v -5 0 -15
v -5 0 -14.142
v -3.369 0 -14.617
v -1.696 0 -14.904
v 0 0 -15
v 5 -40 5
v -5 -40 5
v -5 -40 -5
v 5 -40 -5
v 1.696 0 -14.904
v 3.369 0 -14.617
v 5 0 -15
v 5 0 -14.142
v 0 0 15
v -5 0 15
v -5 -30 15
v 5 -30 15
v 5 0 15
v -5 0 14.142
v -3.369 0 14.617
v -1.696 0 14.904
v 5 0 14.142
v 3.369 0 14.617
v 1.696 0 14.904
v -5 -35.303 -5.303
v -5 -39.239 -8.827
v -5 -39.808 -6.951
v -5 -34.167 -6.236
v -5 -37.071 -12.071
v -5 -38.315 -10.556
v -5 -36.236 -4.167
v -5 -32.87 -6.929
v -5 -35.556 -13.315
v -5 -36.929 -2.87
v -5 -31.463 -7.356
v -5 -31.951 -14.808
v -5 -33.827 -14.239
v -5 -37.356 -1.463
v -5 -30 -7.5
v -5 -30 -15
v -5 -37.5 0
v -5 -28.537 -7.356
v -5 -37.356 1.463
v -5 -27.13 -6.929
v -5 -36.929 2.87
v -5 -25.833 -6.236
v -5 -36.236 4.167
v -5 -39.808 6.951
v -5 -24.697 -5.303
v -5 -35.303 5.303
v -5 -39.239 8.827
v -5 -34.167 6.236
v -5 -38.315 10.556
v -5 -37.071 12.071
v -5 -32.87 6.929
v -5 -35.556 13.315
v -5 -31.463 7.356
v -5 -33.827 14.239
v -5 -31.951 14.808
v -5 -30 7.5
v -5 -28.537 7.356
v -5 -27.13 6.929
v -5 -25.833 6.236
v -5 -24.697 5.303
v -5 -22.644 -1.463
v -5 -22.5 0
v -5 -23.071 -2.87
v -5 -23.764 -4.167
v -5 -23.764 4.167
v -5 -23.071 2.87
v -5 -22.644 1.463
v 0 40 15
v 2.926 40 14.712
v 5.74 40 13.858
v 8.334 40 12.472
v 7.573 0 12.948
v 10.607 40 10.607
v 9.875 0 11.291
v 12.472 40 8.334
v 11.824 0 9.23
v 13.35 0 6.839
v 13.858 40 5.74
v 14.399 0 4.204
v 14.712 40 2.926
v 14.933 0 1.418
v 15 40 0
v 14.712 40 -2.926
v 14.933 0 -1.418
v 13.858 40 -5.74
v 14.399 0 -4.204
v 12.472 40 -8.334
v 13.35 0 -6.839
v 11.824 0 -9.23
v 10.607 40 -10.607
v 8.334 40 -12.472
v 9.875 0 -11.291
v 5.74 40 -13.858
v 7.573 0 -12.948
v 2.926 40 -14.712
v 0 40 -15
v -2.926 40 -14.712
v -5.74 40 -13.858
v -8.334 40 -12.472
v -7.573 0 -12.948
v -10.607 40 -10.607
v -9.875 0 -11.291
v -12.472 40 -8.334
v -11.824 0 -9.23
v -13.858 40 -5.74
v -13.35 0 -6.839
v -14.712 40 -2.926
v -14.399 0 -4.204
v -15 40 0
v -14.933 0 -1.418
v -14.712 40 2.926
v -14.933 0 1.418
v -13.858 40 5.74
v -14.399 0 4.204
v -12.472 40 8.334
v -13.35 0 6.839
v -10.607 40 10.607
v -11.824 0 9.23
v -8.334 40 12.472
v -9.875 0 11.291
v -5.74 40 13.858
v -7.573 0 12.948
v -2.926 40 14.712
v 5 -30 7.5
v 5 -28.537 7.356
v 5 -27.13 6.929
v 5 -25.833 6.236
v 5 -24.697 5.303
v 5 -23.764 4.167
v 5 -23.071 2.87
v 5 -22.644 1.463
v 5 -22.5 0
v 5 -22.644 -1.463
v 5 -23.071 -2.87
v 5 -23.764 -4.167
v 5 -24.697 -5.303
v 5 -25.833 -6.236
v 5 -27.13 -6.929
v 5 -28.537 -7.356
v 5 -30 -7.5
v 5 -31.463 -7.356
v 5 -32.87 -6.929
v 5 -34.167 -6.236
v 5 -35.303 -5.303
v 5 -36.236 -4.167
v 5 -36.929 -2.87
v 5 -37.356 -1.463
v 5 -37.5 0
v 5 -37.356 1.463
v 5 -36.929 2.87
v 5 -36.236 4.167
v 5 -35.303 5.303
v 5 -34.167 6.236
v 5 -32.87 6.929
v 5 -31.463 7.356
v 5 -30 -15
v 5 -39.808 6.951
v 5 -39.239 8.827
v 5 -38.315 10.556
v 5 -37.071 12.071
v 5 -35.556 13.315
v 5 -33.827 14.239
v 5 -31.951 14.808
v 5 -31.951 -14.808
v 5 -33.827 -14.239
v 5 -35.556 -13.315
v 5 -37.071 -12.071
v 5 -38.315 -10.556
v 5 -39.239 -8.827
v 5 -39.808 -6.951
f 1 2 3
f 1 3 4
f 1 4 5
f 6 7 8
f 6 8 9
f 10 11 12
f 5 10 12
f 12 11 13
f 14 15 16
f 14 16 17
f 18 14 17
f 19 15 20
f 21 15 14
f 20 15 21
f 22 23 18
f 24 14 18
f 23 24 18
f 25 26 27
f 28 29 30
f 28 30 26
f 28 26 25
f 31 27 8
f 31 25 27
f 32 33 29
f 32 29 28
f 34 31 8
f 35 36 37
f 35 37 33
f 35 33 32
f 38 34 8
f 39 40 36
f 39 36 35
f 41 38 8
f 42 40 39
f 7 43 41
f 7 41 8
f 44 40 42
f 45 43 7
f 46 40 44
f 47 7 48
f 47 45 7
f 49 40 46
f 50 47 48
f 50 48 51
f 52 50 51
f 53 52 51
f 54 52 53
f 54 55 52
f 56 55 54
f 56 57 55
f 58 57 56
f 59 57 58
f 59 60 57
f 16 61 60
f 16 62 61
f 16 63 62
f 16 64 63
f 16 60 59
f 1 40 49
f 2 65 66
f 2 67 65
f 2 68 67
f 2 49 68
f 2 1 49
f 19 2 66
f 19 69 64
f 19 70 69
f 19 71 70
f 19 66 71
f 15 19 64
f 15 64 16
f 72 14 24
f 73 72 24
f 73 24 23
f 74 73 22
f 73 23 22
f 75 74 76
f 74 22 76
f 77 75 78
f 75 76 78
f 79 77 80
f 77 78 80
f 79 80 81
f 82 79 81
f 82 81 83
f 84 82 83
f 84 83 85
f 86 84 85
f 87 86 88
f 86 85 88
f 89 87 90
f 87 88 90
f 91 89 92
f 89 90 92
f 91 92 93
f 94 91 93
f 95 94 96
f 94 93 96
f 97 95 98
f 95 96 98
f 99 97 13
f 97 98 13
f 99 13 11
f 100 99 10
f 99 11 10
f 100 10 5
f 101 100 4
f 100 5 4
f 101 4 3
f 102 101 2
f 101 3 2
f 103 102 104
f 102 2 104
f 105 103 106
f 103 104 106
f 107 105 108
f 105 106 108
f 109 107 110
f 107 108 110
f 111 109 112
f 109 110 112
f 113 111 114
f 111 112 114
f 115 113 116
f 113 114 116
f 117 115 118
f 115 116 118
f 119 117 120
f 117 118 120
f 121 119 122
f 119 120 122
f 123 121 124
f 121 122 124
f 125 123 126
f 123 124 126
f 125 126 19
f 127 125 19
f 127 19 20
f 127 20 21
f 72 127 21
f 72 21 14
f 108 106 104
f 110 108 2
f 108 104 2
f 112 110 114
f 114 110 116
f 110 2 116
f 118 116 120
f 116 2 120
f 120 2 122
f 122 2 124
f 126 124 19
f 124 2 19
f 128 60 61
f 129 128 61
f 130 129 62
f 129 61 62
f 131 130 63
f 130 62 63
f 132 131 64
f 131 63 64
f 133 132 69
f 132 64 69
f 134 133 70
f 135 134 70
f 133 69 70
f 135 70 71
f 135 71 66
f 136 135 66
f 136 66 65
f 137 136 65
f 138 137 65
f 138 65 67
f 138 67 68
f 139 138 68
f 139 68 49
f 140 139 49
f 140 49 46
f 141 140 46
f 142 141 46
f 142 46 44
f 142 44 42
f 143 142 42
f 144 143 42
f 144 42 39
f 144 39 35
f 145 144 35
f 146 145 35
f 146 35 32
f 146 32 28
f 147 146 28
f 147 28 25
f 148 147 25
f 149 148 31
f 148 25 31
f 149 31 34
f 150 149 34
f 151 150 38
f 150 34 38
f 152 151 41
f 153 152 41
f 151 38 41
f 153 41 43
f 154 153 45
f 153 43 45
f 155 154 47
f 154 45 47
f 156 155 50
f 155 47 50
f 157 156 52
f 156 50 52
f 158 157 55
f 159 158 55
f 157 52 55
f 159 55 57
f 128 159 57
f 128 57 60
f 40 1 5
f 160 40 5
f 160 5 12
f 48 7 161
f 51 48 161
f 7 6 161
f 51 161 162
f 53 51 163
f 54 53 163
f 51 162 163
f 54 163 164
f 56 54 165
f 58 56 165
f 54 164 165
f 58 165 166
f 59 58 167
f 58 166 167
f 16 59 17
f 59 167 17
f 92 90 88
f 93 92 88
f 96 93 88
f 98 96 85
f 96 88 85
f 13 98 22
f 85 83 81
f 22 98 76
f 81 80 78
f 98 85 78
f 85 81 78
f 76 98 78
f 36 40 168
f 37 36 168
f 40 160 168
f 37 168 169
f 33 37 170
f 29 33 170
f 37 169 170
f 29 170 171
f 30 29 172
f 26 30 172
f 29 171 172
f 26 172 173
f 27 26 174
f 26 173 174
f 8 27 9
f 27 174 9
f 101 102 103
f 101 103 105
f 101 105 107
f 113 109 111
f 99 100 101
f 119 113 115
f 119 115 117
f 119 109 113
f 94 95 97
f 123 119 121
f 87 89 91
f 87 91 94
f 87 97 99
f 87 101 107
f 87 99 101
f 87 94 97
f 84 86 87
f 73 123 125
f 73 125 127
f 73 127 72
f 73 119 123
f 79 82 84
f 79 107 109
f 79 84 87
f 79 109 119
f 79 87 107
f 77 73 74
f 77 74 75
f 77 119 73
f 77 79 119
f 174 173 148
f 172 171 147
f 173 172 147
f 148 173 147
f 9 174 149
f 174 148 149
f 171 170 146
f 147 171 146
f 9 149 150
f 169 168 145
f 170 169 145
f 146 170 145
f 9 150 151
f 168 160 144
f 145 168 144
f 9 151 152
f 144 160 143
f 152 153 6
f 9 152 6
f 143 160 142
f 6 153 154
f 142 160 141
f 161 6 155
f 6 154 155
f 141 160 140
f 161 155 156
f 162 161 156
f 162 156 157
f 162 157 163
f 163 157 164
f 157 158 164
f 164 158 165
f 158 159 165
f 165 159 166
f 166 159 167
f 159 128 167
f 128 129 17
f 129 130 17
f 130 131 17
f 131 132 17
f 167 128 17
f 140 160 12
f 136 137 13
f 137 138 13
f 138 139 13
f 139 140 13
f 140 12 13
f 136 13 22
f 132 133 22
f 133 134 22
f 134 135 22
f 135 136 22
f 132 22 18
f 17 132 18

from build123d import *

# Parameters (mm, degrees)
SKETCH1_R           = 15
BOSS_EXTRUDE1_DEPTH = 40
SKETCH2_W           = 10
SKETCH2_H           = 30
BOSS_EXTRUDE2_DEPTH = 40
SKETCH3_R           = 7.5
CUT_EXTRUDE1_DEPTH  = 40
FILLET2_R           = 10


with BuildPart() as part:
    # Sketch1 → Boss-Extrude1 (new body)
    with BuildSketch(Plane(origin=(0, 0, 0), x_dir=(1, 0, 0), z_dir=(0, 1, 0))):
        with Locations(Location((0, 0, 0), (0, 0, 270))):
            Circle(SKETCH1_R)
    extrude(amount=BOSS_EXTRUDE1_DEPTH)

    # Sketch2 → Boss-Extrude2 (add)
    with BuildSketch(Plane.XZ):
        Rectangle(SKETCH2_W, SKETCH2_H)
    extrude(amount=BOSS_EXTRUDE2_DEPTH)

    # Sketch3 → Cut-Extrude1 (cut)
    with BuildSketch(Plane.ZY.offset(5)):
        with Locations((0, -30)):
            Circle(SKETCH3_R)
    extrude(amount=-CUT_EXTRUDE1_DEPTH, mode=Mode.SUBTRACT)

    # Fillet2
    fillet2_edges = [part.edges().sort_by_distance(p)[0] for p in [
        (0, -40, 15),
        (0, -40, -15),
    ]]
    fillet(fillet2_edges, radius=FILLET2_R)


solid = part.part
